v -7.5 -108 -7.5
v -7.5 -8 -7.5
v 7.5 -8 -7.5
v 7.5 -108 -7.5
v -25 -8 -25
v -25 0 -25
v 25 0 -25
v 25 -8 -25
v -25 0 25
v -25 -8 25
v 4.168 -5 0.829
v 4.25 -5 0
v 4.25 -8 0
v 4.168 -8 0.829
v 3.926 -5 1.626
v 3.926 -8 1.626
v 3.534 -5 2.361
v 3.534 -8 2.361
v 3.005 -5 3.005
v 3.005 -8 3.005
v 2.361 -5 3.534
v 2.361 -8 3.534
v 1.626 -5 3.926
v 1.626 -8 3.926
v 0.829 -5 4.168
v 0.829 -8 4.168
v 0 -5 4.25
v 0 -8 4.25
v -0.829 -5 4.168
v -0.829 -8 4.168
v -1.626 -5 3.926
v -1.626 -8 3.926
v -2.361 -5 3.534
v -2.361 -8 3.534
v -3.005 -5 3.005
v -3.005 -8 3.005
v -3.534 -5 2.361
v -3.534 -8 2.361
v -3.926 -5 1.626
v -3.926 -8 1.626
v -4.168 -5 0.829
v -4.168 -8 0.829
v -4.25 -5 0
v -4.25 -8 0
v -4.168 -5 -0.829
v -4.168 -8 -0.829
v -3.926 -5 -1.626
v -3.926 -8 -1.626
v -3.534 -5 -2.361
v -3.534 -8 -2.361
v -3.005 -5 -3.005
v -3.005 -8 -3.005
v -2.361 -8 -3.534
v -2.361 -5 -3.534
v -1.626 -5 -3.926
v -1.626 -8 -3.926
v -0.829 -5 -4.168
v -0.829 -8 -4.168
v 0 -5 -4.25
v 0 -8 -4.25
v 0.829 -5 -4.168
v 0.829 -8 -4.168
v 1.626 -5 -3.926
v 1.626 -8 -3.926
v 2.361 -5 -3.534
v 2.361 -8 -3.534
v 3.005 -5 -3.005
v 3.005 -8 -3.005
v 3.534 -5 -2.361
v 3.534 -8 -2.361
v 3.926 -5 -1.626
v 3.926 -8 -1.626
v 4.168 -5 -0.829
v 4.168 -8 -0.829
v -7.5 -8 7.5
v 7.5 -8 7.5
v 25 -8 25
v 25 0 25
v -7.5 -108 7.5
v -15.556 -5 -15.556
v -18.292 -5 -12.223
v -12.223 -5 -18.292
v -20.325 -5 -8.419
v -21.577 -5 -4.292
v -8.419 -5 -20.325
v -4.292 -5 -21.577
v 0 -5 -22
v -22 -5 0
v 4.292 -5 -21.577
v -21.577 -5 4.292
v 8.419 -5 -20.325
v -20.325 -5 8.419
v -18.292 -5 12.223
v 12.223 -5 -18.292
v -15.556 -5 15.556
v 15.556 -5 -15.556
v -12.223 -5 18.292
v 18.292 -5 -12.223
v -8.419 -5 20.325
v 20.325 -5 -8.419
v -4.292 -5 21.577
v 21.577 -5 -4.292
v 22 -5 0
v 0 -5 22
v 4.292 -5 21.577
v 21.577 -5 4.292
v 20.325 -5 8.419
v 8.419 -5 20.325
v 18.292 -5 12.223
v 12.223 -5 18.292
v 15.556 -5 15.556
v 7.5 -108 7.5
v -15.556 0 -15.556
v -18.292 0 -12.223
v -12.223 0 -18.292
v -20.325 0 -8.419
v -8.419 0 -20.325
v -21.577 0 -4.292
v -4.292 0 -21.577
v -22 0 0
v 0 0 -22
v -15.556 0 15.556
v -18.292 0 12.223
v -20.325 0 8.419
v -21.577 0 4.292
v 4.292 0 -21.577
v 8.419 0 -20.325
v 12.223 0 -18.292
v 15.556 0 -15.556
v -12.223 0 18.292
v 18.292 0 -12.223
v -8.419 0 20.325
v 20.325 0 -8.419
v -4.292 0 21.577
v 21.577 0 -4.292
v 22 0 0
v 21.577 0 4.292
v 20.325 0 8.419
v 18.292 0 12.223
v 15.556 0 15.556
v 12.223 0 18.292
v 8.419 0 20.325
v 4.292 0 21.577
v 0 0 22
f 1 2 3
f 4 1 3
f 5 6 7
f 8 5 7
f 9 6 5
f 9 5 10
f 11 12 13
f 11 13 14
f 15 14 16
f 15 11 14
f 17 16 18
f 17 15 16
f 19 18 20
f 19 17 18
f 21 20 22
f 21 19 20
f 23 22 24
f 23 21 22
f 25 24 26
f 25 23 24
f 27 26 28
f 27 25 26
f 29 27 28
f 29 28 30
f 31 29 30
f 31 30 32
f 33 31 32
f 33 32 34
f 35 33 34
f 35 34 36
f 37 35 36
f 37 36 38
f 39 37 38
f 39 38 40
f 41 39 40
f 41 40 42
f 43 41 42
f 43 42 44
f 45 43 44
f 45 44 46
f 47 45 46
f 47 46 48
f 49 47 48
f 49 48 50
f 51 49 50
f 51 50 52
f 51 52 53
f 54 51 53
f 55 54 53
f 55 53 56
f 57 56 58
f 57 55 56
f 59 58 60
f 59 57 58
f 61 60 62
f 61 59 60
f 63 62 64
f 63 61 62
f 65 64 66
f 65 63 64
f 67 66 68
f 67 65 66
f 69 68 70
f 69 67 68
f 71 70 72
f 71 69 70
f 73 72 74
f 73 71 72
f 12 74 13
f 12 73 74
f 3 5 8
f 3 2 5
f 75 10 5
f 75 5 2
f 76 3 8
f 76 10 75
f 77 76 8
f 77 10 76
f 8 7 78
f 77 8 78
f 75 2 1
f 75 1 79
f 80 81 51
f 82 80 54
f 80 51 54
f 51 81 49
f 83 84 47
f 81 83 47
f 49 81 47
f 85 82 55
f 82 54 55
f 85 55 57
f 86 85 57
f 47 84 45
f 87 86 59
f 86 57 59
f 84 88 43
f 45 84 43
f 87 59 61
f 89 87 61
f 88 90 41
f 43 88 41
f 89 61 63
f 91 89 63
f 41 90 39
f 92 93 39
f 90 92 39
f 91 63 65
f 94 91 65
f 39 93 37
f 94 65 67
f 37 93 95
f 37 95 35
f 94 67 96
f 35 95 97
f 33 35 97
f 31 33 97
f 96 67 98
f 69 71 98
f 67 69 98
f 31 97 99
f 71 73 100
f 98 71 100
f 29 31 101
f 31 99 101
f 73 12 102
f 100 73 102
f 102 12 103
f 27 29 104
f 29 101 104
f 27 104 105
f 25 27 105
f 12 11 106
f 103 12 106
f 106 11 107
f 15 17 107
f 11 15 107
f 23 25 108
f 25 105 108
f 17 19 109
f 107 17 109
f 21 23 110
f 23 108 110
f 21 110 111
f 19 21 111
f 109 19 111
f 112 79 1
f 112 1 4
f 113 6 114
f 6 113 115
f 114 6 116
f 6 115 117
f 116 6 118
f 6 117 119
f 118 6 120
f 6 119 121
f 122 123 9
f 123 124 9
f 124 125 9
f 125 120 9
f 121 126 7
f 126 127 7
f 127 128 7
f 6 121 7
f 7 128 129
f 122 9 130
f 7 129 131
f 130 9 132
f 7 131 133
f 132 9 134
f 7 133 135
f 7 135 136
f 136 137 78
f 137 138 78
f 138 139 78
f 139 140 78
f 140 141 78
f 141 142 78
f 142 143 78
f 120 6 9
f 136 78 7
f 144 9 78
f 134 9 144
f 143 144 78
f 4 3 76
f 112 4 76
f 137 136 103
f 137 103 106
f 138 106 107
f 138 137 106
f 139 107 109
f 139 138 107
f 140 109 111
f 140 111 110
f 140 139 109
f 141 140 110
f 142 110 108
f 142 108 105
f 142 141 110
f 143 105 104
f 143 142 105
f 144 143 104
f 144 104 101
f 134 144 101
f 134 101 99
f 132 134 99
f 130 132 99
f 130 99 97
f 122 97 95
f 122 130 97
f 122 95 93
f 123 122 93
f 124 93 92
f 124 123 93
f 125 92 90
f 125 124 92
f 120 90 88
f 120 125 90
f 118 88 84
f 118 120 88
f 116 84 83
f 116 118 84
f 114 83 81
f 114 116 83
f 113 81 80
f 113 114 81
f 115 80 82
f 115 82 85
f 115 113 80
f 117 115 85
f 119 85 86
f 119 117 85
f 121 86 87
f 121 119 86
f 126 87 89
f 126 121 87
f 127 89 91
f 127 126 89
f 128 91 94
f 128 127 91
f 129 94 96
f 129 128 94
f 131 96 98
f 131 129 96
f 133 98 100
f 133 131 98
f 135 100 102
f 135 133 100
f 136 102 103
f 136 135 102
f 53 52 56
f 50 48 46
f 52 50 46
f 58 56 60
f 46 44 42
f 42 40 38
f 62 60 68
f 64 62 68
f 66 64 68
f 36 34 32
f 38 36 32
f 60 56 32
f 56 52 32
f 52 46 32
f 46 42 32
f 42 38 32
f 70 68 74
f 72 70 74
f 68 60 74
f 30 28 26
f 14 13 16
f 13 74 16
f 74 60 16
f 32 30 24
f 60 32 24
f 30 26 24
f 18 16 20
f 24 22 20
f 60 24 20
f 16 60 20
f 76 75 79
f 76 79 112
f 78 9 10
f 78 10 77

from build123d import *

# Parameters (mm, degrees)
F0_W     = 50
F0_H     = 50
F0_R     = 4.25
F1_DEPTH = 8
F2_R     = 22
F3_DEPTH = 5
F4_W     = 15
F4_H     = 15
F5_DEPTH = 100


with BuildPart() as f1:
    # F0 (on Front) → F1 (new body)
    with BuildSketch(Plane.XZ):
        Rectangle(F0_W, F0_H)
        Circle(F0_R, mode=Mode.SUBTRACT)
    extrude(amount=F1_DEPTH)

    # F2 (on Front) → F3 (cut)
    with BuildSketch(Plane.XZ):
        Circle(F2_R)
    extrude(amount=F3_DEPTH, mode=Mode.SUBTRACT)

    # F4 (on face) → F5 (join)
    with BuildSketch(Plane.XZ.offset(8)):
        Rectangle(F4_W, F4_H)
    extrude(amount=F5_DEPTH)


solid = f1.part
